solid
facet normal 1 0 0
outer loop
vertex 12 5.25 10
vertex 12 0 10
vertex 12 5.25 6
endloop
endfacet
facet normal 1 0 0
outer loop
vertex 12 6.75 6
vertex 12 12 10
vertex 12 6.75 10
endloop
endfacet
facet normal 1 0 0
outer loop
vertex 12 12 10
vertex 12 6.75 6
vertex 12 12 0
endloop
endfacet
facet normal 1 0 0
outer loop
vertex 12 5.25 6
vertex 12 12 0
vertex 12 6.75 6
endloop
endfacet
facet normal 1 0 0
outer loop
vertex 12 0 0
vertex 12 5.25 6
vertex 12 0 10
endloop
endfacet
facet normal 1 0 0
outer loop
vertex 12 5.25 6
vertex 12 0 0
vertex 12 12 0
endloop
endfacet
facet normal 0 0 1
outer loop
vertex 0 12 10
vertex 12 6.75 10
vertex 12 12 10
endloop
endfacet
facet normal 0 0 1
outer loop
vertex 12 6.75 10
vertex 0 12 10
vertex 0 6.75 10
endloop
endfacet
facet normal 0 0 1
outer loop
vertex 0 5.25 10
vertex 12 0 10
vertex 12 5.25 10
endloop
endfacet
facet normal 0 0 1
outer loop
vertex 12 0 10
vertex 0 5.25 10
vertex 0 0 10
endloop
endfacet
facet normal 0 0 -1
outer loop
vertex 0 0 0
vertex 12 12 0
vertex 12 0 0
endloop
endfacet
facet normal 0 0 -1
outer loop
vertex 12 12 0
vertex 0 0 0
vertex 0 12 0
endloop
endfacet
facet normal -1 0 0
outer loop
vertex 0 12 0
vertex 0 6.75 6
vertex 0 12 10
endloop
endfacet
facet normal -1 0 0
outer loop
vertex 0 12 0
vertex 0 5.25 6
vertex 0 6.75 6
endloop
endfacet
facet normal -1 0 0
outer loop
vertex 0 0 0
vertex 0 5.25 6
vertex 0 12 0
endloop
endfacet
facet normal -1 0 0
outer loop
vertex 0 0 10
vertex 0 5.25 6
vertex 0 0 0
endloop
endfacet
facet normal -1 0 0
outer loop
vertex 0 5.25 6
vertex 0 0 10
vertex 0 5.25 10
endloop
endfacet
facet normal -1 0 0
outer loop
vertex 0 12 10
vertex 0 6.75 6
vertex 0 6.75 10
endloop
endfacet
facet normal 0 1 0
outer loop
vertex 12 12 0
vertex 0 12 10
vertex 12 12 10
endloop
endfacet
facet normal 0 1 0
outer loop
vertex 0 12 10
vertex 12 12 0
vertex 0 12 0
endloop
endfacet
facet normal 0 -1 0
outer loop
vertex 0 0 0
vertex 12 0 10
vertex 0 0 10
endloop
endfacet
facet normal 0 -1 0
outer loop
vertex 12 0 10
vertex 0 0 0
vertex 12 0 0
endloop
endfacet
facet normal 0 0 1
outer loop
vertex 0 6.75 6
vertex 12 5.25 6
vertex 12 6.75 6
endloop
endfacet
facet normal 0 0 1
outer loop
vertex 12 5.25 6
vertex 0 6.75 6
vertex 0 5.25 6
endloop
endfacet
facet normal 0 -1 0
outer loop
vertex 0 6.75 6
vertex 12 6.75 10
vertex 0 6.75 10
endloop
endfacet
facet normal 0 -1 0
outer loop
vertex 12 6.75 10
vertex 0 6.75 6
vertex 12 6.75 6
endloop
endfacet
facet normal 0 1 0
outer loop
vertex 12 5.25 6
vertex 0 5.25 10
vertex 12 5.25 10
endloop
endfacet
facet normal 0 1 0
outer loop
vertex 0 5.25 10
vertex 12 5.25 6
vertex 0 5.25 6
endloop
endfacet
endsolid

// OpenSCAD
$fn = 32;

// ----------------------------------------------------------------------
// Micro clip: slotted block, 5-20 mm class
// ----------------------------------------------------------------------

// --- parameters (mm) ---
block_l = 12;             // block length, X
block_w = 12;             // block width, Y
block_h = 10;             // block height, Z
slot_w = 1.5;             // slot width
slot_d = 4;               // slot depth from the top

difference() {
  cube([block_l, block_w, block_h]);
  translate([-1, block_w / 2 - slot_w / 2, block_h - slot_d])
    cube([block_l + 2, slot_w, slot_d + 1]);
}
